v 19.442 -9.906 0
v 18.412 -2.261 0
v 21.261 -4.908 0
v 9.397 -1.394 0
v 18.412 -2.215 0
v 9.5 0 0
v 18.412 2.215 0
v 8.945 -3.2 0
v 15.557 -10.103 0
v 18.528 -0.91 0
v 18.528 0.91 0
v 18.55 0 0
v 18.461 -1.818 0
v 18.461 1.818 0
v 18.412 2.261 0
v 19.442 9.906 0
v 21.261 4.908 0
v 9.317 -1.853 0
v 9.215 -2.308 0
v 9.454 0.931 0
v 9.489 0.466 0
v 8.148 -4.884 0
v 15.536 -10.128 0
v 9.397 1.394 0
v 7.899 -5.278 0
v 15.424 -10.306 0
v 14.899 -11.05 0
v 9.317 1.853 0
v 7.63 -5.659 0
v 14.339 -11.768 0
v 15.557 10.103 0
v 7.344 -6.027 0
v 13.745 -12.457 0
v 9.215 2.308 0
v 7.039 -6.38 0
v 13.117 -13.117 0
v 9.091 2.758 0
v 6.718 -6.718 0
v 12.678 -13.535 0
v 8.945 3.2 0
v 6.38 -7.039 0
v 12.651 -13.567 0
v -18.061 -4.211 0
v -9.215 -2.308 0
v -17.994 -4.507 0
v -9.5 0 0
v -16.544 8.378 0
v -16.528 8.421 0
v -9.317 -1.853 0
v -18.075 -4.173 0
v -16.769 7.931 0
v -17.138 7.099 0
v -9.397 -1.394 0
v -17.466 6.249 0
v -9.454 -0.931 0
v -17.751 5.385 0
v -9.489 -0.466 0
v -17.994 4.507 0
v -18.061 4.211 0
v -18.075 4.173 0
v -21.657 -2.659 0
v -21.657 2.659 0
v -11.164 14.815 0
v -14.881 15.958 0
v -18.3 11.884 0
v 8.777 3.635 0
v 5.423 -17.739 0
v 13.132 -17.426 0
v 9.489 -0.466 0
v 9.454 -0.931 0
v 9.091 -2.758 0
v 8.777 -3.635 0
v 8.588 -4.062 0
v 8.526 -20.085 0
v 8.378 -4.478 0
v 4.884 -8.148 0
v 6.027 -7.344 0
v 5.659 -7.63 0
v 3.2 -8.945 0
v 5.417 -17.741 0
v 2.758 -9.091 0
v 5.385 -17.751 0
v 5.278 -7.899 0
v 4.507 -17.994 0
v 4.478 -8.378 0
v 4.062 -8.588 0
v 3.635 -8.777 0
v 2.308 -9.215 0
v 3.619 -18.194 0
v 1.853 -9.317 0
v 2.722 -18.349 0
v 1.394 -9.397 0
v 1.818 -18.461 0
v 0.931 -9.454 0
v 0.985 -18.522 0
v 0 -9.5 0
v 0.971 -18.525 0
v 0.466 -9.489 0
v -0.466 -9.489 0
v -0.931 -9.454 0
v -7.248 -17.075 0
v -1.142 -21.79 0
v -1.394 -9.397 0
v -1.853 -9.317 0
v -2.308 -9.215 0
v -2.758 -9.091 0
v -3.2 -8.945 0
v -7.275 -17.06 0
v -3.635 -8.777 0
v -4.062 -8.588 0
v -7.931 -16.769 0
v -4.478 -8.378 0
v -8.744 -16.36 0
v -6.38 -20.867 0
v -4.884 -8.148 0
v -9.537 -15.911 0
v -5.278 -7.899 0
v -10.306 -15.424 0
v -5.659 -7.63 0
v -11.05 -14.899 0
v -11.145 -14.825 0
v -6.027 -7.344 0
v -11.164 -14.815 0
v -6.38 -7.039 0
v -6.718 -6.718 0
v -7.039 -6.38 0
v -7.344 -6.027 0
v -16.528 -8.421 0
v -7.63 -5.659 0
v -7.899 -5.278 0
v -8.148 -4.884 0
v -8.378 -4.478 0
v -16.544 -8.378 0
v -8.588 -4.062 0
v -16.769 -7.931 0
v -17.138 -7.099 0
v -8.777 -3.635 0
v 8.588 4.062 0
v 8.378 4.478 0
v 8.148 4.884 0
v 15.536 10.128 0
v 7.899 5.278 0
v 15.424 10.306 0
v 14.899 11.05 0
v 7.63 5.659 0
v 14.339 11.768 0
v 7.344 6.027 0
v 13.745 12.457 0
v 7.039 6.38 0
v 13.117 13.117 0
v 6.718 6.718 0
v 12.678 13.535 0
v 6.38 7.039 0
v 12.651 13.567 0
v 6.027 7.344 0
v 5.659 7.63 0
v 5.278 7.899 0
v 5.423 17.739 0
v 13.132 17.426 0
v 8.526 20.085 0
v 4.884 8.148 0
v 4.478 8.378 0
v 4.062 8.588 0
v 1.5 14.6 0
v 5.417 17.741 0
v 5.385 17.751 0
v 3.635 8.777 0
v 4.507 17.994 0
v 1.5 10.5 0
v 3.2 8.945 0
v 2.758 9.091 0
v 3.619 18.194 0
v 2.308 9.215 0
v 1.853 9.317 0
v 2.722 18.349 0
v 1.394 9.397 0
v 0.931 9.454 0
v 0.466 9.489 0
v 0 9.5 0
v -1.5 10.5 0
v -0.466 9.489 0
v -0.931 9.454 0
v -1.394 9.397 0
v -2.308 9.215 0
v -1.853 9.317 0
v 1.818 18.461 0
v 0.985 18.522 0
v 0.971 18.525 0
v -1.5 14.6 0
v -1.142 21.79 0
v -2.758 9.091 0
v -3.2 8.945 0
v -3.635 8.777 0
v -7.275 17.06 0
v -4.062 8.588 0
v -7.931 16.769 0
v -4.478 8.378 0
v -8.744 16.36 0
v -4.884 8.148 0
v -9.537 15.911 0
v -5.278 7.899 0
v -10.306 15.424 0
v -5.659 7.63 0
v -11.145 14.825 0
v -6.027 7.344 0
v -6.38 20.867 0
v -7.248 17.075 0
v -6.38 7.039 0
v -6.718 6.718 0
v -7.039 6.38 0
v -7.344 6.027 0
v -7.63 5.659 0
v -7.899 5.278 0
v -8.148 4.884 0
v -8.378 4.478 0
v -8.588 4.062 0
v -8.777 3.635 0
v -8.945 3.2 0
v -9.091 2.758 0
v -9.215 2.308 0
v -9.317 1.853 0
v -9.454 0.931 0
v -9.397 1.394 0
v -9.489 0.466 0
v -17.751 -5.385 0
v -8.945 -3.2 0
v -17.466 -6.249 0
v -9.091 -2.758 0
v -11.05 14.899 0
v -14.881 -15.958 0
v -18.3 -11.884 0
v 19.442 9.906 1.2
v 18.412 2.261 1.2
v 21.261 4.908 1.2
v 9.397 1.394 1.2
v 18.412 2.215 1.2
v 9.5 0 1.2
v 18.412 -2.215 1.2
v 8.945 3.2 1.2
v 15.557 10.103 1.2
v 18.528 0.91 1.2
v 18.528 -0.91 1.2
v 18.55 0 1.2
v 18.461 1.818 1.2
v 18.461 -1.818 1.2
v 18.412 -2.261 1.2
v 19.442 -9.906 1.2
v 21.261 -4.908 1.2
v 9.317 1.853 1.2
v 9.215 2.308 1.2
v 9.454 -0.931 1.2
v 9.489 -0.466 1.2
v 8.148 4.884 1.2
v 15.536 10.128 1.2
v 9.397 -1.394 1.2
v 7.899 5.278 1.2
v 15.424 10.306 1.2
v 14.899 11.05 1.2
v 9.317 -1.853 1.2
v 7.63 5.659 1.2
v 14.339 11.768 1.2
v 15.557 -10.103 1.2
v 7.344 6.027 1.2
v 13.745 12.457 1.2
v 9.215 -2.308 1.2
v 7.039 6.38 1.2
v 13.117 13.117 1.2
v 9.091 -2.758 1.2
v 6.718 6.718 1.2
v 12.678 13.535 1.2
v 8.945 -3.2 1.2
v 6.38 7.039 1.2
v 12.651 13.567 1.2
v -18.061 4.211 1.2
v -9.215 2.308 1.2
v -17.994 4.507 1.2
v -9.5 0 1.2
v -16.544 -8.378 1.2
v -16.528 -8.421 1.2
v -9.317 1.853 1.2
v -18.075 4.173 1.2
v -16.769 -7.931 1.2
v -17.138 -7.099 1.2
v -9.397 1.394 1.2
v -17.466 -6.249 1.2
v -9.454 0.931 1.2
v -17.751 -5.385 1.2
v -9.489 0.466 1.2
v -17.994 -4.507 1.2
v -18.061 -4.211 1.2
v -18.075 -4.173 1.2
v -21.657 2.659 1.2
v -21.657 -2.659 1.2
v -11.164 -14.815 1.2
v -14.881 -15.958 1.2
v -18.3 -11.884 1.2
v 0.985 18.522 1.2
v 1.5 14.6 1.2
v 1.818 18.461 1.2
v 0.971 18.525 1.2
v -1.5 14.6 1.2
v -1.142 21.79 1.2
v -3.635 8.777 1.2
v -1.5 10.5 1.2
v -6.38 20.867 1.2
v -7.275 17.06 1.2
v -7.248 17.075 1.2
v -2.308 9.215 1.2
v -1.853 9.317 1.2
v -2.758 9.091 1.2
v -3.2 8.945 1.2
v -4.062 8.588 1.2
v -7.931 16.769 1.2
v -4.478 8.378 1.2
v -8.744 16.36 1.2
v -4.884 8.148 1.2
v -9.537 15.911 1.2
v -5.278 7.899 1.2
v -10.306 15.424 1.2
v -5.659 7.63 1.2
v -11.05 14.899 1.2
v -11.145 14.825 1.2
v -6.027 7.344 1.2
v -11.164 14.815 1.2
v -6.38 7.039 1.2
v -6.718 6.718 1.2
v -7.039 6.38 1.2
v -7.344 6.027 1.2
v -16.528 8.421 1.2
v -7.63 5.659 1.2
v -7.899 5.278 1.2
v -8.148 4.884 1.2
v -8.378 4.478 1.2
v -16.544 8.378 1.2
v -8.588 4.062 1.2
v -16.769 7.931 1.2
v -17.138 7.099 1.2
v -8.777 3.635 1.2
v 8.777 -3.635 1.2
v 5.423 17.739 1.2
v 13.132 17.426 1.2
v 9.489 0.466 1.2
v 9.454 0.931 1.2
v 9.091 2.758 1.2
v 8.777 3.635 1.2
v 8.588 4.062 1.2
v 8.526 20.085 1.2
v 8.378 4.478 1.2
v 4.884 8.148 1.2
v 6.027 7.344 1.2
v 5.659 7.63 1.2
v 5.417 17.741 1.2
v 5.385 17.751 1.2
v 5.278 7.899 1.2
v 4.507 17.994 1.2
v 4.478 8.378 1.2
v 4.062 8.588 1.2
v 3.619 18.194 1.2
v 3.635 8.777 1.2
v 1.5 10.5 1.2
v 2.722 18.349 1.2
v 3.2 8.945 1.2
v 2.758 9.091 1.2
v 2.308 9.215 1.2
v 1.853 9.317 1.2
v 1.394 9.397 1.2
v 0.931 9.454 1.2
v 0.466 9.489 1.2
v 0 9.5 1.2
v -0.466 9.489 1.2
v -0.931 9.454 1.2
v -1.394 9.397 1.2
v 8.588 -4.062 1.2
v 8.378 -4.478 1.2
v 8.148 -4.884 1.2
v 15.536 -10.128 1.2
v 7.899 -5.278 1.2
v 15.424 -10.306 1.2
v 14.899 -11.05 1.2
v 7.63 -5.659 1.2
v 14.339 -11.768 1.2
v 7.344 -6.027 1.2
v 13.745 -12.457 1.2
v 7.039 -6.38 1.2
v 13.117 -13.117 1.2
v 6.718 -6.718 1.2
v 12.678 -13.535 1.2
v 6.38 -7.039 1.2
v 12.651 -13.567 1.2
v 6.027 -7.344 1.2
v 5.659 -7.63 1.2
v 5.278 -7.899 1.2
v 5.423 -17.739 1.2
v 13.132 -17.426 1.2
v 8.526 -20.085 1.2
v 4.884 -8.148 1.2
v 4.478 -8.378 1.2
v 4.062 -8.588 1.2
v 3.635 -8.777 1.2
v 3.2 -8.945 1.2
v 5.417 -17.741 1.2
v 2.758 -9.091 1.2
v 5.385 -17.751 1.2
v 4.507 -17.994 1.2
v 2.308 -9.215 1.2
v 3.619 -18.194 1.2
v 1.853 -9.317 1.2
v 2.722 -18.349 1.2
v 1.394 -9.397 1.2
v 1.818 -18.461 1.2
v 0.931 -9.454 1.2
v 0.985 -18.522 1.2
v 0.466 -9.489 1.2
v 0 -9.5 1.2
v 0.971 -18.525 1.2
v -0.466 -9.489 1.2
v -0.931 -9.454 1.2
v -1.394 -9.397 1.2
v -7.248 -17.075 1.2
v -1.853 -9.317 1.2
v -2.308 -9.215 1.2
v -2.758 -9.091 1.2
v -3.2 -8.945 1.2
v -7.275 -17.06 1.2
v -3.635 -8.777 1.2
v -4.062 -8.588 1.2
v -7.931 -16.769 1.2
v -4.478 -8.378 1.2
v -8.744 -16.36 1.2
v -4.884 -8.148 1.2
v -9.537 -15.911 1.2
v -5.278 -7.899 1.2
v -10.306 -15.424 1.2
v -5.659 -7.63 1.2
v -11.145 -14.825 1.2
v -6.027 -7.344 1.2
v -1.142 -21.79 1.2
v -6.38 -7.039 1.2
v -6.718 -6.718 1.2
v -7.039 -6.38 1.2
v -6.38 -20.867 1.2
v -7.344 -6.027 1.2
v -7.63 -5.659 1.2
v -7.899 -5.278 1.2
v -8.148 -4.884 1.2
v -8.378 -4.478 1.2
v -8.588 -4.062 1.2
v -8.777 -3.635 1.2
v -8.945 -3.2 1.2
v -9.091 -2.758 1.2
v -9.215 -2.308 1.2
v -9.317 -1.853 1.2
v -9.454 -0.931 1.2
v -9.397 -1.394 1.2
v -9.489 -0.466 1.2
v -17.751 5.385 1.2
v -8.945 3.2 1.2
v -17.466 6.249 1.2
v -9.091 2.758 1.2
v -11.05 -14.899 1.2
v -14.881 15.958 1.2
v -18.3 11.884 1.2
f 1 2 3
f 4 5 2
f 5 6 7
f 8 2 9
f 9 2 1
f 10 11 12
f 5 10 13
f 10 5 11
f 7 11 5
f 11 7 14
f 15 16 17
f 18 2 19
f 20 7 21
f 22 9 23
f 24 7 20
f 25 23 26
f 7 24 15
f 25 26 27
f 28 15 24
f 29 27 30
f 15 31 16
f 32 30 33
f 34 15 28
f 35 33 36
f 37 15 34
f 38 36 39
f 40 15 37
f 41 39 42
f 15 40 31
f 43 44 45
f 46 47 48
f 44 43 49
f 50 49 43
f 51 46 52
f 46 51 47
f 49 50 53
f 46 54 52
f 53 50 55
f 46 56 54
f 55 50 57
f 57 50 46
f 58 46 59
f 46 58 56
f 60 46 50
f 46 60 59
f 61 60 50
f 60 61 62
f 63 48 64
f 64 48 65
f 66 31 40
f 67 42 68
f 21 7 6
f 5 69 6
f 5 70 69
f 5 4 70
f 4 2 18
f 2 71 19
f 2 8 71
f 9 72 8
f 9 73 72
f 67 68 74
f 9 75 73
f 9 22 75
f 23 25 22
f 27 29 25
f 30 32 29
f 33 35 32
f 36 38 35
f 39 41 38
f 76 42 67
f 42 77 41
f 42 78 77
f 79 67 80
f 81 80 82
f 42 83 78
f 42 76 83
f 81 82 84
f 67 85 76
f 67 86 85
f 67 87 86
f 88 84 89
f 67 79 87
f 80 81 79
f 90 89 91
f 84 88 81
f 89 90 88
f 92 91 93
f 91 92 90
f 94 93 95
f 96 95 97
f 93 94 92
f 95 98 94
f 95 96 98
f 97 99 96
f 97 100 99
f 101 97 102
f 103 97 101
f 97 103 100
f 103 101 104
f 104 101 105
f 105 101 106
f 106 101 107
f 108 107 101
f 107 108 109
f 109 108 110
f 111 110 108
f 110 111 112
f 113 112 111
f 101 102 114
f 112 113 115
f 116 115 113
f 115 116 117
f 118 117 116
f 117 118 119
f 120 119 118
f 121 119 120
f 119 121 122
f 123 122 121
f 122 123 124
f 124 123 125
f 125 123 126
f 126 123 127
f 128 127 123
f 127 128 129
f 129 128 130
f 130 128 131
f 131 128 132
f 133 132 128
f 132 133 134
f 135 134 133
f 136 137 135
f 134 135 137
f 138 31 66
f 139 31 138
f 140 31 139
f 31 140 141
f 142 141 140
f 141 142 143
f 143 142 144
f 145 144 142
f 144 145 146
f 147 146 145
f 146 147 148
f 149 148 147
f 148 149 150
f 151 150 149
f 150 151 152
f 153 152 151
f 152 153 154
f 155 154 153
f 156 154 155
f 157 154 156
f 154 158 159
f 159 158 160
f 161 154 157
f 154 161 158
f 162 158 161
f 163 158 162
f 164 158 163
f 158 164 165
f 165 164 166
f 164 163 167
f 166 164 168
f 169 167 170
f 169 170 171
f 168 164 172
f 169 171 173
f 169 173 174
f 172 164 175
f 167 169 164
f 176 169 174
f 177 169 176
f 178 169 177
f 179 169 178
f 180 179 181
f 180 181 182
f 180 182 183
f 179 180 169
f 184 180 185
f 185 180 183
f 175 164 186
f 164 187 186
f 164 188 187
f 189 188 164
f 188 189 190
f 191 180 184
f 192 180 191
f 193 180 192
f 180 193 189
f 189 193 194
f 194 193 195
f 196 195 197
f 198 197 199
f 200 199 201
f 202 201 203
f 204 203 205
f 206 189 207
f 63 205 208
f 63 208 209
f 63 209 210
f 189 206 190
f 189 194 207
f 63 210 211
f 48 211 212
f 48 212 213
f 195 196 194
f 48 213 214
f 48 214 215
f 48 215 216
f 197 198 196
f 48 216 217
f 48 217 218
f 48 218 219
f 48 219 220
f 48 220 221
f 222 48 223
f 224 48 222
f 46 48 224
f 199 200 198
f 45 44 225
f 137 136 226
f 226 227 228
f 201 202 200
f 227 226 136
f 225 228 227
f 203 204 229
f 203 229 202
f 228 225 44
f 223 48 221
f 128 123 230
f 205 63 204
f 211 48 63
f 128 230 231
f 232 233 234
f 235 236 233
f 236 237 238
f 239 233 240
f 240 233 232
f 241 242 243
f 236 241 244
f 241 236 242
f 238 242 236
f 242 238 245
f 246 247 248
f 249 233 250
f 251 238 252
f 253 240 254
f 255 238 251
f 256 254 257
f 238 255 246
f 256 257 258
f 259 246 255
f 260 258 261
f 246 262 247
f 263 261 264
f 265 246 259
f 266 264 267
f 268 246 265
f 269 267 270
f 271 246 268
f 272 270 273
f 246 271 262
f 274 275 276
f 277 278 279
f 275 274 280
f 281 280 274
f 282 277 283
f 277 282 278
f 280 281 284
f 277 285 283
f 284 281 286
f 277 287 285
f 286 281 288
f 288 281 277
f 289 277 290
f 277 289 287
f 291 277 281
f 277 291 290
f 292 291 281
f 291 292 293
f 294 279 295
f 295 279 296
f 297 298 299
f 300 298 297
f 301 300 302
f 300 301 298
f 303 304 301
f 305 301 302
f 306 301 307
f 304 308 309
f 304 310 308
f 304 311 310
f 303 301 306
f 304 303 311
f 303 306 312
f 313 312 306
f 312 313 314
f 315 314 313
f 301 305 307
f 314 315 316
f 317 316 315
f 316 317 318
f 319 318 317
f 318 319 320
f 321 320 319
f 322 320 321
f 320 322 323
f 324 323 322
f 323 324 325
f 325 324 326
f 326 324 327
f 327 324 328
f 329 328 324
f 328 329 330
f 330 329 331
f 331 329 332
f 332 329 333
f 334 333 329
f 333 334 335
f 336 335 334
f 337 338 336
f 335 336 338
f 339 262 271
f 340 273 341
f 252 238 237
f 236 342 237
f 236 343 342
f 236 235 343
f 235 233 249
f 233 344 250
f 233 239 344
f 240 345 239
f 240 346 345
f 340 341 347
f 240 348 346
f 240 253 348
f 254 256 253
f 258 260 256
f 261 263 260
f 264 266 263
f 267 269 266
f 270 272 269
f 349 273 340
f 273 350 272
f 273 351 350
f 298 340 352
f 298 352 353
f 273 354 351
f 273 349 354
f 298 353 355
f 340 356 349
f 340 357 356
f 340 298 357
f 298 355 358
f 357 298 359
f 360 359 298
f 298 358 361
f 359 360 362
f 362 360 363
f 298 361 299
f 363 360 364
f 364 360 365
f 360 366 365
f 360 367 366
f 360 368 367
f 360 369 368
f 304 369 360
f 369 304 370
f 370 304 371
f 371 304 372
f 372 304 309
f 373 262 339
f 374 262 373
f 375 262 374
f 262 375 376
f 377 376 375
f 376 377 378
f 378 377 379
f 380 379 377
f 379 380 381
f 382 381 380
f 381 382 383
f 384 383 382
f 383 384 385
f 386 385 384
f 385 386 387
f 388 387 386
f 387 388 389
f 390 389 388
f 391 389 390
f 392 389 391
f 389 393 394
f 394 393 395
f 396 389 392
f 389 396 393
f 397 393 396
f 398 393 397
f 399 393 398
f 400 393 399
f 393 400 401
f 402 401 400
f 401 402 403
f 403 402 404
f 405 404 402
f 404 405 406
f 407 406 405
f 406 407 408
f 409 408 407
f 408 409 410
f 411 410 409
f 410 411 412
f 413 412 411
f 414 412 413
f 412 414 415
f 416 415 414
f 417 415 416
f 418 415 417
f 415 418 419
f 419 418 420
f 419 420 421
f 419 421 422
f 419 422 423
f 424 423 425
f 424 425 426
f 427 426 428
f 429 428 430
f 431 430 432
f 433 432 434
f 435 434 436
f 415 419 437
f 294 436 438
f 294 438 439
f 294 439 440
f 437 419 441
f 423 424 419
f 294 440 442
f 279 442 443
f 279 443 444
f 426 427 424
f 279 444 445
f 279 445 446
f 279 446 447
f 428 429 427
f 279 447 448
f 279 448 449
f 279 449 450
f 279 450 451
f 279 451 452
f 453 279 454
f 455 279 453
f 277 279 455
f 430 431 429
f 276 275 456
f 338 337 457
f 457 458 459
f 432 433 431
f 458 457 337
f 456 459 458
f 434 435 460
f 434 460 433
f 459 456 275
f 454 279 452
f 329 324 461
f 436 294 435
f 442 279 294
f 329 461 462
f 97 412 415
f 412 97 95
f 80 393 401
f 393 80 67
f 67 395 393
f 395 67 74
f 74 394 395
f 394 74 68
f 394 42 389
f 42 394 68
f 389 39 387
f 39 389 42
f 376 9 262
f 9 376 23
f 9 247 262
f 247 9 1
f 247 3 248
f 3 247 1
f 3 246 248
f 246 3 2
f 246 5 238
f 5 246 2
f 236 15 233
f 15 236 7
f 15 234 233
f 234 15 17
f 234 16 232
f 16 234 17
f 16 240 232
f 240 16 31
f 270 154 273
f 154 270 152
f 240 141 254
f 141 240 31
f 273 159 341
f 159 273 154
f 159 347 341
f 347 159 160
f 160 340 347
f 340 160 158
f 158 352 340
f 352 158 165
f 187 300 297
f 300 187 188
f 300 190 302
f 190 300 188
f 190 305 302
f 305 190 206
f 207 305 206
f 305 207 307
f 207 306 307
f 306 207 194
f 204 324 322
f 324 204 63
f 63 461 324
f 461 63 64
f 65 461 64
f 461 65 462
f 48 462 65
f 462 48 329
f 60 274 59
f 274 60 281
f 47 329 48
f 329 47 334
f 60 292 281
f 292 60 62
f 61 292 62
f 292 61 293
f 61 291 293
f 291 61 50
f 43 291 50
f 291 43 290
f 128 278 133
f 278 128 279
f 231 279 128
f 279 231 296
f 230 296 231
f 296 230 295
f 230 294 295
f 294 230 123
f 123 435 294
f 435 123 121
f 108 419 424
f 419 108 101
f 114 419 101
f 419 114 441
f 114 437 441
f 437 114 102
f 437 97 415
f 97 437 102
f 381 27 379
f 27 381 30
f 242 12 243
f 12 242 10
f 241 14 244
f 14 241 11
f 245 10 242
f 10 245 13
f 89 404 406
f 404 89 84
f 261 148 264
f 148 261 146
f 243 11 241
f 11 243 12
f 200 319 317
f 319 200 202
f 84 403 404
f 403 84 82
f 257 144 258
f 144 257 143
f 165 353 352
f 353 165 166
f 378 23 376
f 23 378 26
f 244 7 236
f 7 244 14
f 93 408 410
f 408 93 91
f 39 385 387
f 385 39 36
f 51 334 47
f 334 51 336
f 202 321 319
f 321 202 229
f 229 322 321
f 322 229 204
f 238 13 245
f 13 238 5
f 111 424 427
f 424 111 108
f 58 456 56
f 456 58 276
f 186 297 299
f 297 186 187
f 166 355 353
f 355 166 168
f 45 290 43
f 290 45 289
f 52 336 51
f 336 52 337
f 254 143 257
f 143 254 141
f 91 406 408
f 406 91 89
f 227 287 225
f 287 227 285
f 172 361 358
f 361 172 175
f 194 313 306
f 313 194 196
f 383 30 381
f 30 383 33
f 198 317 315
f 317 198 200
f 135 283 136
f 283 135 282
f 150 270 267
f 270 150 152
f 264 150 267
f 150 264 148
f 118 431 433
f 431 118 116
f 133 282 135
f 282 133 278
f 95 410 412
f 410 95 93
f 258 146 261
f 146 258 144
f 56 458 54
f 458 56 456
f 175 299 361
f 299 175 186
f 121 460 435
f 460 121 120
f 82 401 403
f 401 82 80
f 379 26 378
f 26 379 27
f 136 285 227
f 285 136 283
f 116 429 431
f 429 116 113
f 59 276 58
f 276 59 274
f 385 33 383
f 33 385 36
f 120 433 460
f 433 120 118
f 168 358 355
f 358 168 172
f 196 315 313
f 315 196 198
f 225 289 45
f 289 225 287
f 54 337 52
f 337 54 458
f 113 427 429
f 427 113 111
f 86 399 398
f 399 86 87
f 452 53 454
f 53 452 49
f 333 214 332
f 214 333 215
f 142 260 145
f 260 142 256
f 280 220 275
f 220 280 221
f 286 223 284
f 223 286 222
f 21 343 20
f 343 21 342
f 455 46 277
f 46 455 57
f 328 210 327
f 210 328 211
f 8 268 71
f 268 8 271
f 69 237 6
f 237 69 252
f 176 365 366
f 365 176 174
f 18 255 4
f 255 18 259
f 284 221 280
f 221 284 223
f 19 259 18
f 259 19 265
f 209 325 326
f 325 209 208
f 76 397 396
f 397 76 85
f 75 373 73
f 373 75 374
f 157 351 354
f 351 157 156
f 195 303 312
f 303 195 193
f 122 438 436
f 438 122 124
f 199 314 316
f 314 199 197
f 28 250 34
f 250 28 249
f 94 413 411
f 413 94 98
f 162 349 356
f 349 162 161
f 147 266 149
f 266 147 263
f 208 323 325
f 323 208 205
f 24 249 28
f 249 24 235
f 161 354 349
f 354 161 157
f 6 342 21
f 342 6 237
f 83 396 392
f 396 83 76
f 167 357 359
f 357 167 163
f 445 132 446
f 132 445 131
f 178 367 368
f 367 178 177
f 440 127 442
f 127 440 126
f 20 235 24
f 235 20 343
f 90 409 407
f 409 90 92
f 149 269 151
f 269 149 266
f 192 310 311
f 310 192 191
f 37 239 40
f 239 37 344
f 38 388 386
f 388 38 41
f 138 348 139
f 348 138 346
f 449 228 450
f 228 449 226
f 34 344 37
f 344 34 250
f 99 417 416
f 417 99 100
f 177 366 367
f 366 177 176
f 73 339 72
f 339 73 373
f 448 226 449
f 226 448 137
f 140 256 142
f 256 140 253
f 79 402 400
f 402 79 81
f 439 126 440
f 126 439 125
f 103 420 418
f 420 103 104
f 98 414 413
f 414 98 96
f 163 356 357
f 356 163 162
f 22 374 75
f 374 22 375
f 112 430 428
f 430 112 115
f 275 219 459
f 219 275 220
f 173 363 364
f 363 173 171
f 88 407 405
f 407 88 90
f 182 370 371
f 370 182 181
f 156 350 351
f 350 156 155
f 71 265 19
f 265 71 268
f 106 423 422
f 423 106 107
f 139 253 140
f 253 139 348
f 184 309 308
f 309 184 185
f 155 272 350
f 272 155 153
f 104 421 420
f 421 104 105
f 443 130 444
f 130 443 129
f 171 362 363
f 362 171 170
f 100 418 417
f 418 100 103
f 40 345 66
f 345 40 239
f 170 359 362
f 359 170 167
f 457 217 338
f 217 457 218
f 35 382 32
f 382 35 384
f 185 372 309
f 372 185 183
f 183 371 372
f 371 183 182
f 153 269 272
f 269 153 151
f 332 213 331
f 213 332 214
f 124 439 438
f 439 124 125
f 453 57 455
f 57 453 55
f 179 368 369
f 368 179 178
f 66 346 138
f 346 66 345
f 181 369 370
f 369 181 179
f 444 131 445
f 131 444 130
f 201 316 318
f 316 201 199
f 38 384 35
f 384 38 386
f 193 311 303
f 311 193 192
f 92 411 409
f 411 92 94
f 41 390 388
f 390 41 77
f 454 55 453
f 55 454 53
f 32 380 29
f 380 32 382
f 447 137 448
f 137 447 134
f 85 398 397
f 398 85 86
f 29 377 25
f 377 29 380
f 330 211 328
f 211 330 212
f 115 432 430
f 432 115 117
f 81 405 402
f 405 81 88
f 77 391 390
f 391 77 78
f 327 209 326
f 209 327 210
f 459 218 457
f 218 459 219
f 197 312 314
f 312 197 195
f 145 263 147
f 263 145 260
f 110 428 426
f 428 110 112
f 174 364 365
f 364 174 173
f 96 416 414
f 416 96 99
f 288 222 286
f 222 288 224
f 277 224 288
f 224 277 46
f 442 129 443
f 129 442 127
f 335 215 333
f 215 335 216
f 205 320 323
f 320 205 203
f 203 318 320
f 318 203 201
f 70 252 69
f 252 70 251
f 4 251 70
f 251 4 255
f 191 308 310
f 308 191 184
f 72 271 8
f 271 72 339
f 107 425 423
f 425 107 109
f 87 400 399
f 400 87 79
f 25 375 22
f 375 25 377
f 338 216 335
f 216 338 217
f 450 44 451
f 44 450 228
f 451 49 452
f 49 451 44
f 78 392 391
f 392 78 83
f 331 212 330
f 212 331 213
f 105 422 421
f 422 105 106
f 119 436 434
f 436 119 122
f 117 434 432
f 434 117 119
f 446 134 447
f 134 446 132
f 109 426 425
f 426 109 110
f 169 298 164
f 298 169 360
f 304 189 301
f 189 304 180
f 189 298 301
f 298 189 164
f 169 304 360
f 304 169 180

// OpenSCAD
/*
  Elna Supermatic cam 03
  Name: Zigzag reference
  Status: uploaded-stl/scad-reference

  Generated from measured parametric base v2.
  Surface mode: stepped
*/

include <_elna_measured_common.scad>;

profile_points = [
        [0.9708, 18.5246],
        [5.4235, 17.7395],
        [8.5258, 20.0854],
        [13.1316, 17.4262],
        [12.6511, 13.5666],
        [15.5573, 10.1031],
        [19.4418, 9.9061],
        [21.2608, 4.9084],
        [18.4117, 2.2607],
        [18.4117, -2.2607],
        [21.2608, -4.9084],
        [19.4418, -9.9061],
        [15.5573, -10.1031],
        [12.6511, -13.5666],
        [13.1316, -17.4262],
        [8.5258, -20.0854],
        [5.4235, -17.7395],
        [0.9708, -18.5246],
        [-1.1420, -21.7901],
        [-6.3796, -20.8666],
        [-7.2481, -17.0754],
        [-11.1637, -14.8147],
        [-14.8812, -15.9581],
        [-18.2998, -11.8840],
        [-16.5282, -8.4215],
        [-18.0746, -4.1728],
        [-21.6574, -2.6592],
        [-21.6574, 2.6592],
        [-18.0746, 4.1728],
        [-16.5282, 8.4215],
        [-18.2998, 11.8840],
        [-14.8812, 15.9581],
        [-11.1637, 14.8147],
        [-7.2481, 17.0754],
        [-6.3796, 20.8666],
        [-1.1420, 21.7901]
];

icon_points = [[-1.000,0.040], [-0.889,0.960], [-0.778,0.040], [-0.667,0.960], [-0.556,0.040], [-0.444,0.960], [-0.333,0.040], [-0.222,0.960], [-0.111,0.040], [0.000,0.960], [0.111,0.040], [0.222,0.960], [0.333,0.040], [0.444,0.960], [0.556,0.040], [0.667,0.960], [0.778,0.040], [0.889,0.960], [1.000,0.040]];

elna_cam_ring(profile_points=profile_points);
